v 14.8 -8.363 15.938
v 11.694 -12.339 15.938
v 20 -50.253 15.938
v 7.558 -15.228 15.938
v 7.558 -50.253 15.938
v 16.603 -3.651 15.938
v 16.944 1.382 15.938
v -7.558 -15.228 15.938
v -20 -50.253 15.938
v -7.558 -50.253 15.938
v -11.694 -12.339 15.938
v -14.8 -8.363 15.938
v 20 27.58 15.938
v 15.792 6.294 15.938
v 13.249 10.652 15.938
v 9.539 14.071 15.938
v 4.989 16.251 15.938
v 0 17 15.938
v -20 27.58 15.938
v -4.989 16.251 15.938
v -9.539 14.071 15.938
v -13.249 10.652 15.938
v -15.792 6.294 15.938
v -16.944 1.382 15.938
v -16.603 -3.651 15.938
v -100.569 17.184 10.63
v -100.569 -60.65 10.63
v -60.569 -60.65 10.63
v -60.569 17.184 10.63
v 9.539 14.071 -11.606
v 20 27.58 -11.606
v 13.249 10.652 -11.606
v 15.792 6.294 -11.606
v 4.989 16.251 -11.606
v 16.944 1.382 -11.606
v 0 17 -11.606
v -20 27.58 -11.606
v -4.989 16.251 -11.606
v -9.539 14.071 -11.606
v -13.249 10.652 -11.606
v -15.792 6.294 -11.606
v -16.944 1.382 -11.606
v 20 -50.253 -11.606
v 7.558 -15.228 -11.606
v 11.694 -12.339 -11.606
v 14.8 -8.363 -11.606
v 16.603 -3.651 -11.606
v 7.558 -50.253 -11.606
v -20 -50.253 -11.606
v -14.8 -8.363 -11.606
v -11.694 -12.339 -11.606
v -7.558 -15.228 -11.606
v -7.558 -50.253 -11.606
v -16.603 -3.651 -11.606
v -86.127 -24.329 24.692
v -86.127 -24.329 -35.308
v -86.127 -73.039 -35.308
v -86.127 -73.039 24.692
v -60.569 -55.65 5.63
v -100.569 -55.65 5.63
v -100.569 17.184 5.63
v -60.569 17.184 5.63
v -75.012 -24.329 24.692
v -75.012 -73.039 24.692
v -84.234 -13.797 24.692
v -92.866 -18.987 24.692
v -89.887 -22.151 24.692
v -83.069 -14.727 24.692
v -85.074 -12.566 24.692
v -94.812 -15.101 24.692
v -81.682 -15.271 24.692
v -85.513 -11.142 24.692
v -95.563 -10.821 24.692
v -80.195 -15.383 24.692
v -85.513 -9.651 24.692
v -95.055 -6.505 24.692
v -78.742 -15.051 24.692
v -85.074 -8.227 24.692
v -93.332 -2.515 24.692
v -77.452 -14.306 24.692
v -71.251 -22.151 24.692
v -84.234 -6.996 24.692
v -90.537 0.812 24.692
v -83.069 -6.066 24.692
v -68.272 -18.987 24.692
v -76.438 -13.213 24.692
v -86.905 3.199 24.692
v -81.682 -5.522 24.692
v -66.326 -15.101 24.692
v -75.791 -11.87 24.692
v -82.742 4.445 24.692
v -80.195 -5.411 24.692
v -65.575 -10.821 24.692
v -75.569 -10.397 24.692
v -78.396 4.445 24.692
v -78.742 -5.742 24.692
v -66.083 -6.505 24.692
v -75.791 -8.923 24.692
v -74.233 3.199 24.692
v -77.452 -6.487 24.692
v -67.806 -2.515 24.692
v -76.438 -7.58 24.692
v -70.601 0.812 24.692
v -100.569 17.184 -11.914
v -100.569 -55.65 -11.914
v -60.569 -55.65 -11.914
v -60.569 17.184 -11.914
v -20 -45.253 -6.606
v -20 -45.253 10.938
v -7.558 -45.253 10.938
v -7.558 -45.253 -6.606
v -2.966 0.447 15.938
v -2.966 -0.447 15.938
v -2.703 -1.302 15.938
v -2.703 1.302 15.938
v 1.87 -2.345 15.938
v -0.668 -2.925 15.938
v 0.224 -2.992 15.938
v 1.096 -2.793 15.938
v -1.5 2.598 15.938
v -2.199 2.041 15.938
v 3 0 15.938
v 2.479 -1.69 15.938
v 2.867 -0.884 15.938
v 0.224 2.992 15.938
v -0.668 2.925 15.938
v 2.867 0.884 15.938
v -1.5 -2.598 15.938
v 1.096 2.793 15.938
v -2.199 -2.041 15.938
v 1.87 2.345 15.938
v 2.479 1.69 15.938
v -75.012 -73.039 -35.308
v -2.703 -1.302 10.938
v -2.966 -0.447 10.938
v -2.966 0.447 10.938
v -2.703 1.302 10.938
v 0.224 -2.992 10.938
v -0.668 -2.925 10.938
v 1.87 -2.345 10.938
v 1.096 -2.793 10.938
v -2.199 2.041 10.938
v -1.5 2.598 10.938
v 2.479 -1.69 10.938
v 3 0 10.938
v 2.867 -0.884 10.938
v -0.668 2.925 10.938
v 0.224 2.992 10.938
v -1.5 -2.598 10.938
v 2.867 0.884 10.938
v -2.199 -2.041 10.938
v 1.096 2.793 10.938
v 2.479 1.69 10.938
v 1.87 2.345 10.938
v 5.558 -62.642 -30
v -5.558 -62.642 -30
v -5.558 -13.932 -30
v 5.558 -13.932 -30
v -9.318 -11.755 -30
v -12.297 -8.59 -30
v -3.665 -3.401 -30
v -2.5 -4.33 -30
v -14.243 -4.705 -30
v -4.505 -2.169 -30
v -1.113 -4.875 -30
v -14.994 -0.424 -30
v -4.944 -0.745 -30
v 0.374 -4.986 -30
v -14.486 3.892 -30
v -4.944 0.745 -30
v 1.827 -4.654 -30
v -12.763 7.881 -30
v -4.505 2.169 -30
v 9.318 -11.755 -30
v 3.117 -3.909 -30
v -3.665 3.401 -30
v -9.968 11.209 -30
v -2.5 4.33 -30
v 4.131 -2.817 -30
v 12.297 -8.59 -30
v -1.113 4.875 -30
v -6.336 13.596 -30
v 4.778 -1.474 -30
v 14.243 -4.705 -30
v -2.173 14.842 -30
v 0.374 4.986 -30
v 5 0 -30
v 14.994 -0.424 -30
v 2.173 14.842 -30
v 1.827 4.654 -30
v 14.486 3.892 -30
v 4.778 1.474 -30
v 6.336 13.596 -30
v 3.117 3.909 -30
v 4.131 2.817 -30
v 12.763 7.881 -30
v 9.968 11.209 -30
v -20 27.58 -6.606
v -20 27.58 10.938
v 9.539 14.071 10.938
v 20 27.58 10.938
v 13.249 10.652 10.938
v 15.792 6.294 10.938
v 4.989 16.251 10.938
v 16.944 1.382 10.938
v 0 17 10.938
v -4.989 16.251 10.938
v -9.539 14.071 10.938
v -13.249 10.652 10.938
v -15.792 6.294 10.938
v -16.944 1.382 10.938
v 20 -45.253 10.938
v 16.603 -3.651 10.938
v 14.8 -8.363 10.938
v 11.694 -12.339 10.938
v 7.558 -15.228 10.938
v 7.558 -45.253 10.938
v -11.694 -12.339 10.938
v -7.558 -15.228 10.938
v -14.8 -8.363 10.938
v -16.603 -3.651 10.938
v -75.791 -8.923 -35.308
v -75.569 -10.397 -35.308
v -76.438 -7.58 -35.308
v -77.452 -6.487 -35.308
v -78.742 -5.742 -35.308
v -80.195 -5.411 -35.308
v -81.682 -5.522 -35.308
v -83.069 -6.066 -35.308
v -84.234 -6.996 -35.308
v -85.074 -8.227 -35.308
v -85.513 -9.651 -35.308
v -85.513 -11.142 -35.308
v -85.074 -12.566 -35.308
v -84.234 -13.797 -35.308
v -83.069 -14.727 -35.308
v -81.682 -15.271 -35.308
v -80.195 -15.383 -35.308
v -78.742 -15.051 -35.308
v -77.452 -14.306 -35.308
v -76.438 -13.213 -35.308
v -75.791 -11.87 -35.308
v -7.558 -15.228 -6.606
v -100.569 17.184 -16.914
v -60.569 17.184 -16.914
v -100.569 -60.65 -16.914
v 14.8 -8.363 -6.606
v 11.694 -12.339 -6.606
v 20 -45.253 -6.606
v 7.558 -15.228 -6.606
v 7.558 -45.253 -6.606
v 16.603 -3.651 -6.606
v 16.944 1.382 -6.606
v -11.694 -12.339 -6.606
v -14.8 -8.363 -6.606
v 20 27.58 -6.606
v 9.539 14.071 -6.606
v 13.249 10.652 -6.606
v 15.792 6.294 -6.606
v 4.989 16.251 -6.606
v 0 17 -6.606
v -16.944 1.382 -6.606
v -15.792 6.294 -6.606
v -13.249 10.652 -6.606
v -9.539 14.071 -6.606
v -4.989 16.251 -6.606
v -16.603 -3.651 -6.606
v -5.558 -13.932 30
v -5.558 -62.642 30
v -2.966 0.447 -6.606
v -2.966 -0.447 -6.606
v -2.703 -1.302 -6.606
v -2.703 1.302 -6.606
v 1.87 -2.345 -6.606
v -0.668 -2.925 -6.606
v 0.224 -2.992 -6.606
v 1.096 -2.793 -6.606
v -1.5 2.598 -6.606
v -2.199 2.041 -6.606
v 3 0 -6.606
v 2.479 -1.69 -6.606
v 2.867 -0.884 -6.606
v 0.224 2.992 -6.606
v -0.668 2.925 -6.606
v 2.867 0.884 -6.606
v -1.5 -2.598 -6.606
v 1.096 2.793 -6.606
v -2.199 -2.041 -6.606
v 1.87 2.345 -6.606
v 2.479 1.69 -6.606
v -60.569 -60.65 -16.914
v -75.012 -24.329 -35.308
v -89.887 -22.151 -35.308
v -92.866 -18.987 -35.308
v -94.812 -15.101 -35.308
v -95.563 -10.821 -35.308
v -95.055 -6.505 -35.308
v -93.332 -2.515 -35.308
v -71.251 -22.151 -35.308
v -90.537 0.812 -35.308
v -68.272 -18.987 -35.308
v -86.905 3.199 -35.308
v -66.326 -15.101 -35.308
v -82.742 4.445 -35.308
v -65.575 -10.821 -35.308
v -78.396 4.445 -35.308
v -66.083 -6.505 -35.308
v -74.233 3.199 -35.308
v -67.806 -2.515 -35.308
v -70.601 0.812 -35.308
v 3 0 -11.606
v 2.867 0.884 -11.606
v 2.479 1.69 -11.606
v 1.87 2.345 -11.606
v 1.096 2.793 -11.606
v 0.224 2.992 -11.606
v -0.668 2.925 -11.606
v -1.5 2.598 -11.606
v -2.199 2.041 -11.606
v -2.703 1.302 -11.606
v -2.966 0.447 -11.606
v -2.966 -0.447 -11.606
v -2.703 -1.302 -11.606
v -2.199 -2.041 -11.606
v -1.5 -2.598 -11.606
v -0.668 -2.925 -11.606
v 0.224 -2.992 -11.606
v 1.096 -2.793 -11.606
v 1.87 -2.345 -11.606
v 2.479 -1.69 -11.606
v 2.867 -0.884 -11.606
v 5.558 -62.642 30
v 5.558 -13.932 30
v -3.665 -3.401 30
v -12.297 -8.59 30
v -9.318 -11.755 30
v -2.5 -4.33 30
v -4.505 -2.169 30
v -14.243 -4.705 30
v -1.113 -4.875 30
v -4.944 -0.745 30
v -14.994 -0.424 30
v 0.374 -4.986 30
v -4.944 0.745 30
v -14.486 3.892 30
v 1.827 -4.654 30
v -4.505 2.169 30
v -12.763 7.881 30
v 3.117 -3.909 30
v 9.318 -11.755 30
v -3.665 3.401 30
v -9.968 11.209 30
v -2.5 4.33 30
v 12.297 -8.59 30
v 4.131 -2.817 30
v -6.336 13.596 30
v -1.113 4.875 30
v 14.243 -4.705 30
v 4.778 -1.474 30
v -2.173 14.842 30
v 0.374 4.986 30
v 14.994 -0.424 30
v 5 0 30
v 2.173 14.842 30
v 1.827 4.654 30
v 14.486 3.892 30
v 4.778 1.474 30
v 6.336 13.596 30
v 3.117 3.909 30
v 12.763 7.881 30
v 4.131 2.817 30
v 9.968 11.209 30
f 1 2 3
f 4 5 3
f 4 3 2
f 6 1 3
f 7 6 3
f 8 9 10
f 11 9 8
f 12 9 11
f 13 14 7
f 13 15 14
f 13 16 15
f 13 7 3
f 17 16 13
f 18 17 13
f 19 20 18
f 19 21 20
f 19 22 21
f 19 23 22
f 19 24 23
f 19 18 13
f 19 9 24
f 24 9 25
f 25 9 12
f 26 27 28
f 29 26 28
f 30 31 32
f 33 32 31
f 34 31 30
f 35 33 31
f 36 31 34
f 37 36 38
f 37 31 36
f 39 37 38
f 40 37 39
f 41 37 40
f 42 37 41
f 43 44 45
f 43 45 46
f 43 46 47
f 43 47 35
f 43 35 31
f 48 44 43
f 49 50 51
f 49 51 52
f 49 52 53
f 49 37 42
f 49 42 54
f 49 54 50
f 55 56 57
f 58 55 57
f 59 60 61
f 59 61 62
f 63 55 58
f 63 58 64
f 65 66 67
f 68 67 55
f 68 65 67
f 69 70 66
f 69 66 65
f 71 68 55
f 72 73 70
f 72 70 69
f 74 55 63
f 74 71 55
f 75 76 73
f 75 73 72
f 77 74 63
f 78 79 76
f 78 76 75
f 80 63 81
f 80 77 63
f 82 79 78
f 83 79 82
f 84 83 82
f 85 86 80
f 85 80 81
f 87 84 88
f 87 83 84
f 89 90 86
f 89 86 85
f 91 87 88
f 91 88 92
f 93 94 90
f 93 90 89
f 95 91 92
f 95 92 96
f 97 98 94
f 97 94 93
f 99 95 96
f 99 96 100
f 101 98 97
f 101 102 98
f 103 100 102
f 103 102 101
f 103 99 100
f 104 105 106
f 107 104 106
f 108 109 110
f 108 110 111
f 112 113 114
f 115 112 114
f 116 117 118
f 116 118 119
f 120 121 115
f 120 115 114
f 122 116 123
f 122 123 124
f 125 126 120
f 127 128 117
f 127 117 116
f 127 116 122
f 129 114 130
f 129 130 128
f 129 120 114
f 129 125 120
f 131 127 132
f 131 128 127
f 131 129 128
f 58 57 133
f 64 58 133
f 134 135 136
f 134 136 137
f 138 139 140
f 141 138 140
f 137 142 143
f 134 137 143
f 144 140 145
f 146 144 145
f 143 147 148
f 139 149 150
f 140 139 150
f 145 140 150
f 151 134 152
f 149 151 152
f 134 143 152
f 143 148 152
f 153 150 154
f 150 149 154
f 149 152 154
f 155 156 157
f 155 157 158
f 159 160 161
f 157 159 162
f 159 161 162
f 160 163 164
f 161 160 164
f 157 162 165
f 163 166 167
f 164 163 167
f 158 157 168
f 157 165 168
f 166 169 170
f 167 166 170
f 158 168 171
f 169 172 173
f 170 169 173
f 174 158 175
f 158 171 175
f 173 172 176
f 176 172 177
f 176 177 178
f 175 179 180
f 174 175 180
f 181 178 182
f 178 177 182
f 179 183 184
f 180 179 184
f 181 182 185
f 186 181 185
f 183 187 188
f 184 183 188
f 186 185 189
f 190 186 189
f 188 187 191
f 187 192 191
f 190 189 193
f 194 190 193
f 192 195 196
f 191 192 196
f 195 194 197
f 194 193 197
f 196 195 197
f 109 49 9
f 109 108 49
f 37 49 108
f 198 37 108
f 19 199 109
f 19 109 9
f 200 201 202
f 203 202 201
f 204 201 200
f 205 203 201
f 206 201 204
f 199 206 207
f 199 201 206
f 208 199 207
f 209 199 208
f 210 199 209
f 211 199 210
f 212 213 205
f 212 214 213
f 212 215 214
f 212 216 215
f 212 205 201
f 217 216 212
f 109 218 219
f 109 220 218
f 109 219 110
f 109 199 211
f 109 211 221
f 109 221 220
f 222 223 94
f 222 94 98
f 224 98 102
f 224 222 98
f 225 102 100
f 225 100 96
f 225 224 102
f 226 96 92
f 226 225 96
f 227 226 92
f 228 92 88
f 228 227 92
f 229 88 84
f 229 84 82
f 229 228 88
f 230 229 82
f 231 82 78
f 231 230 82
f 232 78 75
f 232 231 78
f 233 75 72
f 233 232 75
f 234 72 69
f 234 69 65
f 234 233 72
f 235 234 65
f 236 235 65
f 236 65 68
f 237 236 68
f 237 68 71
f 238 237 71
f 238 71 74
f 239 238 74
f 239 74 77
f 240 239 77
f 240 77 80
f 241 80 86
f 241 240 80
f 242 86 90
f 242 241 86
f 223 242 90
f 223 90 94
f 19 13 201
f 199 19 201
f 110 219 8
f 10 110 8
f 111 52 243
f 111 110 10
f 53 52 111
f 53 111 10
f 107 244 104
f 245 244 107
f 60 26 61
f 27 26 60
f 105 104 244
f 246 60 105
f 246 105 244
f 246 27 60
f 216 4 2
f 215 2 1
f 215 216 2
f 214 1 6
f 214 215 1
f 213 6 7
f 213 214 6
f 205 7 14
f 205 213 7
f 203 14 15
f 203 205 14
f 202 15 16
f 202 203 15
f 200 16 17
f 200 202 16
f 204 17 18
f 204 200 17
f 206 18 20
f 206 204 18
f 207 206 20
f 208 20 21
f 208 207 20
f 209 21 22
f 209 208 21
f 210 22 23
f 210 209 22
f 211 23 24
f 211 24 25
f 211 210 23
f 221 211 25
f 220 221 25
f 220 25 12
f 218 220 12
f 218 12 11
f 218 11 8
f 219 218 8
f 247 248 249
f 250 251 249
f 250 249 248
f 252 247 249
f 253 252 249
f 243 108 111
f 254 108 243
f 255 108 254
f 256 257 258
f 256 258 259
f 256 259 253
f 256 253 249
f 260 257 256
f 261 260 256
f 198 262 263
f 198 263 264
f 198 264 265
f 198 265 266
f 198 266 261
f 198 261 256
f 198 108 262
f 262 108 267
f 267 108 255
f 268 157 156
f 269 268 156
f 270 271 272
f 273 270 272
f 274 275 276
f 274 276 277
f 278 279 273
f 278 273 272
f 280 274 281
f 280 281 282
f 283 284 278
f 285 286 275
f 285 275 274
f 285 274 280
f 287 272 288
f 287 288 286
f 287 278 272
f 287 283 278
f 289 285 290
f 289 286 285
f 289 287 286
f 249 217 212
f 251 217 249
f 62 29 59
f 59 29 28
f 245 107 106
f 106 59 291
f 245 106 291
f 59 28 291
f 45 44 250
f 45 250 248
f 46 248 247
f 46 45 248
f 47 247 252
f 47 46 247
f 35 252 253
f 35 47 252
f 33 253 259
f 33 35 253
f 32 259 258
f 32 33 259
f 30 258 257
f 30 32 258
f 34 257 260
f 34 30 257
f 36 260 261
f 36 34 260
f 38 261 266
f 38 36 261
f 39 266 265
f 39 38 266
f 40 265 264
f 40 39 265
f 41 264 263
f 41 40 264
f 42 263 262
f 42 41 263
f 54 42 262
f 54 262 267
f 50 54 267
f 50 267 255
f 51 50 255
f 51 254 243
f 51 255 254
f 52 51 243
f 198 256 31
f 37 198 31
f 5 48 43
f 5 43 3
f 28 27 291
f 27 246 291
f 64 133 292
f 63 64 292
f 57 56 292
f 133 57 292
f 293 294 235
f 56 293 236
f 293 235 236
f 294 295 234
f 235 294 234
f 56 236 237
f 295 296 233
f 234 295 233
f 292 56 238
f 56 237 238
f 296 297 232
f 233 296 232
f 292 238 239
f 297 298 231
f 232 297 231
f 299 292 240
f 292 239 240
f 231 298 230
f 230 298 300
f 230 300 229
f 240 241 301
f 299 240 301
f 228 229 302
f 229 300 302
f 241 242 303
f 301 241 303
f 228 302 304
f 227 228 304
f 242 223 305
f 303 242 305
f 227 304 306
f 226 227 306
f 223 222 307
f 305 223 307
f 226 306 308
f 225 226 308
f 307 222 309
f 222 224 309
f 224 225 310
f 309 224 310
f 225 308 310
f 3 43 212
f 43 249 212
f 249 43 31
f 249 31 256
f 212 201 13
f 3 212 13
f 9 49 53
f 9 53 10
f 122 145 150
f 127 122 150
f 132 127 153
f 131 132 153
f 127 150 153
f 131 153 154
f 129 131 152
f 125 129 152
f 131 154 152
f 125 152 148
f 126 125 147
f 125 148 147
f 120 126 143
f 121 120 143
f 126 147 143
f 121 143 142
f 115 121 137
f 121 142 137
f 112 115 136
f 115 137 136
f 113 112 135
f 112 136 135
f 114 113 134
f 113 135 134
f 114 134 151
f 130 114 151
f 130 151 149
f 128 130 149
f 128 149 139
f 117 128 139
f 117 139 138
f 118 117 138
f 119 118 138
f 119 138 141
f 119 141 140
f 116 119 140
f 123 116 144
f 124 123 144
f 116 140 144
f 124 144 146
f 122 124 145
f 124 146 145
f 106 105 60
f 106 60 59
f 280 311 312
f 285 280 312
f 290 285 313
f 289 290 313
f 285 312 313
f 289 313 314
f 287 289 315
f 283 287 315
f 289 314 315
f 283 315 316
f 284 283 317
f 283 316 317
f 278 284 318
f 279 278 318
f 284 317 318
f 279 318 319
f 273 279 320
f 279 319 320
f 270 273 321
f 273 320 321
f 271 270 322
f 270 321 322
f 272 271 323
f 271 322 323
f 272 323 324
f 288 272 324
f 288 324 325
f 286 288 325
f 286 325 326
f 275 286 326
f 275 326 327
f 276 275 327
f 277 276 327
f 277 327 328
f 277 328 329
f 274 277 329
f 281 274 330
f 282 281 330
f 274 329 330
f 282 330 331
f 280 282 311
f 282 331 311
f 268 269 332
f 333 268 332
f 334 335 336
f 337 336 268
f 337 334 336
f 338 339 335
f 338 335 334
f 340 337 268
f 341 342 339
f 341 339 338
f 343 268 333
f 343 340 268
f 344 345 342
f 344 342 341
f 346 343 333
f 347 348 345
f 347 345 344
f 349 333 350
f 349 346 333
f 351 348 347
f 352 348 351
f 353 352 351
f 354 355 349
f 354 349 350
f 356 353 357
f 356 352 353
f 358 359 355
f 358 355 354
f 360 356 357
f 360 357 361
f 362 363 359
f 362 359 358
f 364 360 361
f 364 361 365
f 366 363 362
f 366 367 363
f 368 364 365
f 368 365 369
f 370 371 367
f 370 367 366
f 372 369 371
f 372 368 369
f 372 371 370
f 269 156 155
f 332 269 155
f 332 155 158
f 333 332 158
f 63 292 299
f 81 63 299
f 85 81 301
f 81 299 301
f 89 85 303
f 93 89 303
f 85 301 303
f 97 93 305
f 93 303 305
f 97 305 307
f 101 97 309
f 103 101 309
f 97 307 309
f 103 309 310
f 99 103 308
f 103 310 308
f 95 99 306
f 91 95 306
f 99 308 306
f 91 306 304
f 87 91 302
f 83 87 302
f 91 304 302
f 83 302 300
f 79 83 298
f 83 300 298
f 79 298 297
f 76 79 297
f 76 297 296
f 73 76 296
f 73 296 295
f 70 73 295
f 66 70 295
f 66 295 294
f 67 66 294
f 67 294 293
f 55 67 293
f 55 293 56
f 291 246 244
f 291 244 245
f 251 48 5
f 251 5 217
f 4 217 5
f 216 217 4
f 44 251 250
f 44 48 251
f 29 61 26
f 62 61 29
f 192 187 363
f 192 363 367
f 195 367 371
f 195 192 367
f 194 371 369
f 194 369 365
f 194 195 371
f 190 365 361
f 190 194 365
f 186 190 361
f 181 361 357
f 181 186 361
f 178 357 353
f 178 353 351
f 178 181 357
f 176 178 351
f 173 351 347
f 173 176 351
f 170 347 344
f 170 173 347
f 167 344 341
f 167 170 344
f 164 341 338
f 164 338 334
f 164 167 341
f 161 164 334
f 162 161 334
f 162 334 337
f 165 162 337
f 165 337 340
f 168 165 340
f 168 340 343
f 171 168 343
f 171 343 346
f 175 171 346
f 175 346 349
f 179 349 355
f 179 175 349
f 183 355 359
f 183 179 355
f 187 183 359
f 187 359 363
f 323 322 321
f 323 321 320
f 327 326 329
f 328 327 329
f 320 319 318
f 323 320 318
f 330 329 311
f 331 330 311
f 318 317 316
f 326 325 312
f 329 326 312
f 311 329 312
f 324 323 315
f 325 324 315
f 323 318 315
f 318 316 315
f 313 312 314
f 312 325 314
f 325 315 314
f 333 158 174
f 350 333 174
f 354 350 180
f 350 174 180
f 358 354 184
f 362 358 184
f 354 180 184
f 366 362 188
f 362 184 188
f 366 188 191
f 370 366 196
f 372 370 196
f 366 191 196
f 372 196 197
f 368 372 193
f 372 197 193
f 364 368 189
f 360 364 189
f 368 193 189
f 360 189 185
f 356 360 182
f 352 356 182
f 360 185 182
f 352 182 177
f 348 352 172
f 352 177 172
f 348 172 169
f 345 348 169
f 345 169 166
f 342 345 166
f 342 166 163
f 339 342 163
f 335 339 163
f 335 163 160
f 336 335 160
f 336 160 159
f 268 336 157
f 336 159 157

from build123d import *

# Parameters (mm, degrees)
EXTRUDE_5_DEPTH      = 30
EXTRUDE_5_DEPTH_BACK = 30
F_1_FR_R             = 5
EXTRUDE_6_DEPTH      = 20
EXTRUDE_6_DEPTH_BACK = 20
OTHER_START          = -11.605501957
OTHER_1_DEPTH        = 27.543632219
OTHER_START_2        = 10.938130262
OTHER_1_2_OUTLINE_R  = 3
OTHER_1_2_DEPTH      = 5
OTHER_1_3_OUTLINE_R  = 3
OTHER_1_3_DEPTH      = 5
THIS1_2_START        = -60.64972081
THIS1_2_OUTLINE_W    = 40
THIS1_2_OUTLINE_H    = 5
THIS1_2_DEPTH        = 77.833611116
THIS1_2_2_OUTLINE_W  = 40
THIS1_2_2_OUTLINE_H  = 17.543632218
THIS1_2_2_DEPTH      = 5
THIS1_2_START_2      = -35.308248488
THIS1_2_3_OUTLINE_R  = 5
THIS1_2_3_DEPTH      = 60


# Read off the part's stored shape, not the designer's step: Отступ1, this1_2
with BuildPart() as part:
    # Эскиз1_fr → Бобышка-Вытянуть5 (new, two sides: drawn at the far end of the back side and taken through both)
    with BuildSketch(Plane.XY.offset(-EXTRUDE_5_DEPTH_BACK)):
        with BuildLine():
            Line((-5.557606452, -13.932444528), (-5.557606452, -62.642280008))
            Line((-5.557606452, -62.642280008), (5.557606452, -62.642280008))
            Line((5.557606452, -62.642280008), (5.557606452, -13.932444528))
            ThreePointArc((5.557606452, -13.932444528), (0, 15), (-5.557606452, -13.932444528))
        make_face()
        Circle(F_1_FR_R, mode=Mode.SUBTRACT)
    extrude(amount=EXTRUDE_5_DEPTH + EXTRUDE_5_DEPTH_BACK)


with BuildPart() as body_2:
    # Эскиз3 → Бобышка-Вытянуть6 (new, two sides: drawn at the far end of the back side and taken through both)
    with BuildSketch(Plane(origin=(0, 0, 0), x_dir=(0, 0, -1), z_dir=(1, 0, 0)).offset(-EXTRUDE_6_DEPTH_BACK)):
        Polygon((-58.394498043, -50.25314581), (-85.938130262, -50.25314581), (-85.938130262, 27.580465306), (-80.938130262, 27.580465306), (-80.938130262, -45.25314581), (-63.394498043, -45.25314581), (-63.394498043, 27.580465306), (-58.394498043, 27.580465306), align=None)
    extrude(amount=EXTRUDE_6_DEPTH + EXTRUDE_6_DEPTH_BACK)


with BuildPart() as body_2_1:
    # Move Body 1: moved
    add(body_2.part.moved(Location((0, 0, -70))))

    # Отступ1 outline → Отступ1 (cut)
    with BuildSketch(Plane.XY.offset(OTHER_START)):
        with BuildLine():
            ThreePointArc((7.557606452, -15.227691378), (0, 17), (-7.557606452, -15.227691378))
            Line((-7.557606452, -15.227691378), (-7.557606452, -50.25314581))
            Line((-7.557606452, -50.25314581), (7.557606452, -50.25314581))
            Line((7.557606452, -50.25314581), (7.557606452, -15.227691378))
        make_face()
    extrude(amount=OTHER_1_DEPTH, mode=Mode.SUBTRACT)


with BuildPart() as body_3:
    # Other 1 2 outline → Other 1 2 (new body)
    with BuildSketch(Plane.XY.offset(OTHER_START_2)):
        Circle(OTHER_1_2_OUTLINE_R)
    extrude(amount=OTHER_1_2_DEPTH)


with BuildPart() as body_4:
    # Other 1 3 outline → Other 1 3 (new body)
    with BuildSketch(Plane.XY.offset(OTHER_START)):
        Circle(OTHER_1_3_OUTLINE_R)
    extrude(amount=OTHER_1_3_DEPTH)


with BuildPart() as body_5:
    # this1_2 outline → this1_2 (new body)
    with BuildSketch(Plane(origin=(0, 0, 0), x_dir=(1, 0, 0), z_dir=(0, 1, 0)).offset(THIS1_2_START)):
        with Locations((-80.569124199, 14.413750445)):
            Rectangle(THIS1_2_OUTLINE_W, THIS1_2_OUTLINE_H)
        with Locations((-80.569124199, -8.129881773)):
            Rectangle(THIS1_2_OUTLINE_W, THIS1_2_OUTLINE_H)
    extrude(amount=THIS1_2_DEPTH)

    # this1_2 2 outline → this1_2 2 (add)
    with BuildSketch(Plane(origin=(0, 0, 0), x_dir=(1, 0, 0), z_dir=(0, 1, 0)).offset(THIS1_2_START)):
        with Locations((-80.569124199, 3.141934336)):
            Rectangle(THIS1_2_2_OUTLINE_W, THIS1_2_2_OUTLINE_H)
    extrude(amount=THIS1_2_2_DEPTH)


with BuildPart() as body_6:
    # this1_2 3 outline → this1_2 3 (new body)
    with BuildSketch(Plane.XY.offset(THIS1_2_START_2)):
        with BuildLine():
            Line((-75.011517747, -73.038855008), (-75.011517747, -24.329019528))
            ThreePointArc((-75.011517747, -24.329019528), (-80.569124199, 4.603425), (-86.126730651, -24.329019528))
            Line((-86.126730651, -24.329019528), (-86.126730651, -73.038855008))
            Line((-86.126730651, -73.038855008), (-75.011517747, -73.038855008))
        make_face()
        with Locations((-80.569124199, -10.396575)):
            Circle(THIS1_2_3_OUTLINE_R, mode=Mode.SUBTRACT)
    extrude(amount=THIS1_2_3_DEPTH)


solid = Compound([part.part, body_2_1.part, body_3.part, body_4.part, body_5.part, body_6.part])
